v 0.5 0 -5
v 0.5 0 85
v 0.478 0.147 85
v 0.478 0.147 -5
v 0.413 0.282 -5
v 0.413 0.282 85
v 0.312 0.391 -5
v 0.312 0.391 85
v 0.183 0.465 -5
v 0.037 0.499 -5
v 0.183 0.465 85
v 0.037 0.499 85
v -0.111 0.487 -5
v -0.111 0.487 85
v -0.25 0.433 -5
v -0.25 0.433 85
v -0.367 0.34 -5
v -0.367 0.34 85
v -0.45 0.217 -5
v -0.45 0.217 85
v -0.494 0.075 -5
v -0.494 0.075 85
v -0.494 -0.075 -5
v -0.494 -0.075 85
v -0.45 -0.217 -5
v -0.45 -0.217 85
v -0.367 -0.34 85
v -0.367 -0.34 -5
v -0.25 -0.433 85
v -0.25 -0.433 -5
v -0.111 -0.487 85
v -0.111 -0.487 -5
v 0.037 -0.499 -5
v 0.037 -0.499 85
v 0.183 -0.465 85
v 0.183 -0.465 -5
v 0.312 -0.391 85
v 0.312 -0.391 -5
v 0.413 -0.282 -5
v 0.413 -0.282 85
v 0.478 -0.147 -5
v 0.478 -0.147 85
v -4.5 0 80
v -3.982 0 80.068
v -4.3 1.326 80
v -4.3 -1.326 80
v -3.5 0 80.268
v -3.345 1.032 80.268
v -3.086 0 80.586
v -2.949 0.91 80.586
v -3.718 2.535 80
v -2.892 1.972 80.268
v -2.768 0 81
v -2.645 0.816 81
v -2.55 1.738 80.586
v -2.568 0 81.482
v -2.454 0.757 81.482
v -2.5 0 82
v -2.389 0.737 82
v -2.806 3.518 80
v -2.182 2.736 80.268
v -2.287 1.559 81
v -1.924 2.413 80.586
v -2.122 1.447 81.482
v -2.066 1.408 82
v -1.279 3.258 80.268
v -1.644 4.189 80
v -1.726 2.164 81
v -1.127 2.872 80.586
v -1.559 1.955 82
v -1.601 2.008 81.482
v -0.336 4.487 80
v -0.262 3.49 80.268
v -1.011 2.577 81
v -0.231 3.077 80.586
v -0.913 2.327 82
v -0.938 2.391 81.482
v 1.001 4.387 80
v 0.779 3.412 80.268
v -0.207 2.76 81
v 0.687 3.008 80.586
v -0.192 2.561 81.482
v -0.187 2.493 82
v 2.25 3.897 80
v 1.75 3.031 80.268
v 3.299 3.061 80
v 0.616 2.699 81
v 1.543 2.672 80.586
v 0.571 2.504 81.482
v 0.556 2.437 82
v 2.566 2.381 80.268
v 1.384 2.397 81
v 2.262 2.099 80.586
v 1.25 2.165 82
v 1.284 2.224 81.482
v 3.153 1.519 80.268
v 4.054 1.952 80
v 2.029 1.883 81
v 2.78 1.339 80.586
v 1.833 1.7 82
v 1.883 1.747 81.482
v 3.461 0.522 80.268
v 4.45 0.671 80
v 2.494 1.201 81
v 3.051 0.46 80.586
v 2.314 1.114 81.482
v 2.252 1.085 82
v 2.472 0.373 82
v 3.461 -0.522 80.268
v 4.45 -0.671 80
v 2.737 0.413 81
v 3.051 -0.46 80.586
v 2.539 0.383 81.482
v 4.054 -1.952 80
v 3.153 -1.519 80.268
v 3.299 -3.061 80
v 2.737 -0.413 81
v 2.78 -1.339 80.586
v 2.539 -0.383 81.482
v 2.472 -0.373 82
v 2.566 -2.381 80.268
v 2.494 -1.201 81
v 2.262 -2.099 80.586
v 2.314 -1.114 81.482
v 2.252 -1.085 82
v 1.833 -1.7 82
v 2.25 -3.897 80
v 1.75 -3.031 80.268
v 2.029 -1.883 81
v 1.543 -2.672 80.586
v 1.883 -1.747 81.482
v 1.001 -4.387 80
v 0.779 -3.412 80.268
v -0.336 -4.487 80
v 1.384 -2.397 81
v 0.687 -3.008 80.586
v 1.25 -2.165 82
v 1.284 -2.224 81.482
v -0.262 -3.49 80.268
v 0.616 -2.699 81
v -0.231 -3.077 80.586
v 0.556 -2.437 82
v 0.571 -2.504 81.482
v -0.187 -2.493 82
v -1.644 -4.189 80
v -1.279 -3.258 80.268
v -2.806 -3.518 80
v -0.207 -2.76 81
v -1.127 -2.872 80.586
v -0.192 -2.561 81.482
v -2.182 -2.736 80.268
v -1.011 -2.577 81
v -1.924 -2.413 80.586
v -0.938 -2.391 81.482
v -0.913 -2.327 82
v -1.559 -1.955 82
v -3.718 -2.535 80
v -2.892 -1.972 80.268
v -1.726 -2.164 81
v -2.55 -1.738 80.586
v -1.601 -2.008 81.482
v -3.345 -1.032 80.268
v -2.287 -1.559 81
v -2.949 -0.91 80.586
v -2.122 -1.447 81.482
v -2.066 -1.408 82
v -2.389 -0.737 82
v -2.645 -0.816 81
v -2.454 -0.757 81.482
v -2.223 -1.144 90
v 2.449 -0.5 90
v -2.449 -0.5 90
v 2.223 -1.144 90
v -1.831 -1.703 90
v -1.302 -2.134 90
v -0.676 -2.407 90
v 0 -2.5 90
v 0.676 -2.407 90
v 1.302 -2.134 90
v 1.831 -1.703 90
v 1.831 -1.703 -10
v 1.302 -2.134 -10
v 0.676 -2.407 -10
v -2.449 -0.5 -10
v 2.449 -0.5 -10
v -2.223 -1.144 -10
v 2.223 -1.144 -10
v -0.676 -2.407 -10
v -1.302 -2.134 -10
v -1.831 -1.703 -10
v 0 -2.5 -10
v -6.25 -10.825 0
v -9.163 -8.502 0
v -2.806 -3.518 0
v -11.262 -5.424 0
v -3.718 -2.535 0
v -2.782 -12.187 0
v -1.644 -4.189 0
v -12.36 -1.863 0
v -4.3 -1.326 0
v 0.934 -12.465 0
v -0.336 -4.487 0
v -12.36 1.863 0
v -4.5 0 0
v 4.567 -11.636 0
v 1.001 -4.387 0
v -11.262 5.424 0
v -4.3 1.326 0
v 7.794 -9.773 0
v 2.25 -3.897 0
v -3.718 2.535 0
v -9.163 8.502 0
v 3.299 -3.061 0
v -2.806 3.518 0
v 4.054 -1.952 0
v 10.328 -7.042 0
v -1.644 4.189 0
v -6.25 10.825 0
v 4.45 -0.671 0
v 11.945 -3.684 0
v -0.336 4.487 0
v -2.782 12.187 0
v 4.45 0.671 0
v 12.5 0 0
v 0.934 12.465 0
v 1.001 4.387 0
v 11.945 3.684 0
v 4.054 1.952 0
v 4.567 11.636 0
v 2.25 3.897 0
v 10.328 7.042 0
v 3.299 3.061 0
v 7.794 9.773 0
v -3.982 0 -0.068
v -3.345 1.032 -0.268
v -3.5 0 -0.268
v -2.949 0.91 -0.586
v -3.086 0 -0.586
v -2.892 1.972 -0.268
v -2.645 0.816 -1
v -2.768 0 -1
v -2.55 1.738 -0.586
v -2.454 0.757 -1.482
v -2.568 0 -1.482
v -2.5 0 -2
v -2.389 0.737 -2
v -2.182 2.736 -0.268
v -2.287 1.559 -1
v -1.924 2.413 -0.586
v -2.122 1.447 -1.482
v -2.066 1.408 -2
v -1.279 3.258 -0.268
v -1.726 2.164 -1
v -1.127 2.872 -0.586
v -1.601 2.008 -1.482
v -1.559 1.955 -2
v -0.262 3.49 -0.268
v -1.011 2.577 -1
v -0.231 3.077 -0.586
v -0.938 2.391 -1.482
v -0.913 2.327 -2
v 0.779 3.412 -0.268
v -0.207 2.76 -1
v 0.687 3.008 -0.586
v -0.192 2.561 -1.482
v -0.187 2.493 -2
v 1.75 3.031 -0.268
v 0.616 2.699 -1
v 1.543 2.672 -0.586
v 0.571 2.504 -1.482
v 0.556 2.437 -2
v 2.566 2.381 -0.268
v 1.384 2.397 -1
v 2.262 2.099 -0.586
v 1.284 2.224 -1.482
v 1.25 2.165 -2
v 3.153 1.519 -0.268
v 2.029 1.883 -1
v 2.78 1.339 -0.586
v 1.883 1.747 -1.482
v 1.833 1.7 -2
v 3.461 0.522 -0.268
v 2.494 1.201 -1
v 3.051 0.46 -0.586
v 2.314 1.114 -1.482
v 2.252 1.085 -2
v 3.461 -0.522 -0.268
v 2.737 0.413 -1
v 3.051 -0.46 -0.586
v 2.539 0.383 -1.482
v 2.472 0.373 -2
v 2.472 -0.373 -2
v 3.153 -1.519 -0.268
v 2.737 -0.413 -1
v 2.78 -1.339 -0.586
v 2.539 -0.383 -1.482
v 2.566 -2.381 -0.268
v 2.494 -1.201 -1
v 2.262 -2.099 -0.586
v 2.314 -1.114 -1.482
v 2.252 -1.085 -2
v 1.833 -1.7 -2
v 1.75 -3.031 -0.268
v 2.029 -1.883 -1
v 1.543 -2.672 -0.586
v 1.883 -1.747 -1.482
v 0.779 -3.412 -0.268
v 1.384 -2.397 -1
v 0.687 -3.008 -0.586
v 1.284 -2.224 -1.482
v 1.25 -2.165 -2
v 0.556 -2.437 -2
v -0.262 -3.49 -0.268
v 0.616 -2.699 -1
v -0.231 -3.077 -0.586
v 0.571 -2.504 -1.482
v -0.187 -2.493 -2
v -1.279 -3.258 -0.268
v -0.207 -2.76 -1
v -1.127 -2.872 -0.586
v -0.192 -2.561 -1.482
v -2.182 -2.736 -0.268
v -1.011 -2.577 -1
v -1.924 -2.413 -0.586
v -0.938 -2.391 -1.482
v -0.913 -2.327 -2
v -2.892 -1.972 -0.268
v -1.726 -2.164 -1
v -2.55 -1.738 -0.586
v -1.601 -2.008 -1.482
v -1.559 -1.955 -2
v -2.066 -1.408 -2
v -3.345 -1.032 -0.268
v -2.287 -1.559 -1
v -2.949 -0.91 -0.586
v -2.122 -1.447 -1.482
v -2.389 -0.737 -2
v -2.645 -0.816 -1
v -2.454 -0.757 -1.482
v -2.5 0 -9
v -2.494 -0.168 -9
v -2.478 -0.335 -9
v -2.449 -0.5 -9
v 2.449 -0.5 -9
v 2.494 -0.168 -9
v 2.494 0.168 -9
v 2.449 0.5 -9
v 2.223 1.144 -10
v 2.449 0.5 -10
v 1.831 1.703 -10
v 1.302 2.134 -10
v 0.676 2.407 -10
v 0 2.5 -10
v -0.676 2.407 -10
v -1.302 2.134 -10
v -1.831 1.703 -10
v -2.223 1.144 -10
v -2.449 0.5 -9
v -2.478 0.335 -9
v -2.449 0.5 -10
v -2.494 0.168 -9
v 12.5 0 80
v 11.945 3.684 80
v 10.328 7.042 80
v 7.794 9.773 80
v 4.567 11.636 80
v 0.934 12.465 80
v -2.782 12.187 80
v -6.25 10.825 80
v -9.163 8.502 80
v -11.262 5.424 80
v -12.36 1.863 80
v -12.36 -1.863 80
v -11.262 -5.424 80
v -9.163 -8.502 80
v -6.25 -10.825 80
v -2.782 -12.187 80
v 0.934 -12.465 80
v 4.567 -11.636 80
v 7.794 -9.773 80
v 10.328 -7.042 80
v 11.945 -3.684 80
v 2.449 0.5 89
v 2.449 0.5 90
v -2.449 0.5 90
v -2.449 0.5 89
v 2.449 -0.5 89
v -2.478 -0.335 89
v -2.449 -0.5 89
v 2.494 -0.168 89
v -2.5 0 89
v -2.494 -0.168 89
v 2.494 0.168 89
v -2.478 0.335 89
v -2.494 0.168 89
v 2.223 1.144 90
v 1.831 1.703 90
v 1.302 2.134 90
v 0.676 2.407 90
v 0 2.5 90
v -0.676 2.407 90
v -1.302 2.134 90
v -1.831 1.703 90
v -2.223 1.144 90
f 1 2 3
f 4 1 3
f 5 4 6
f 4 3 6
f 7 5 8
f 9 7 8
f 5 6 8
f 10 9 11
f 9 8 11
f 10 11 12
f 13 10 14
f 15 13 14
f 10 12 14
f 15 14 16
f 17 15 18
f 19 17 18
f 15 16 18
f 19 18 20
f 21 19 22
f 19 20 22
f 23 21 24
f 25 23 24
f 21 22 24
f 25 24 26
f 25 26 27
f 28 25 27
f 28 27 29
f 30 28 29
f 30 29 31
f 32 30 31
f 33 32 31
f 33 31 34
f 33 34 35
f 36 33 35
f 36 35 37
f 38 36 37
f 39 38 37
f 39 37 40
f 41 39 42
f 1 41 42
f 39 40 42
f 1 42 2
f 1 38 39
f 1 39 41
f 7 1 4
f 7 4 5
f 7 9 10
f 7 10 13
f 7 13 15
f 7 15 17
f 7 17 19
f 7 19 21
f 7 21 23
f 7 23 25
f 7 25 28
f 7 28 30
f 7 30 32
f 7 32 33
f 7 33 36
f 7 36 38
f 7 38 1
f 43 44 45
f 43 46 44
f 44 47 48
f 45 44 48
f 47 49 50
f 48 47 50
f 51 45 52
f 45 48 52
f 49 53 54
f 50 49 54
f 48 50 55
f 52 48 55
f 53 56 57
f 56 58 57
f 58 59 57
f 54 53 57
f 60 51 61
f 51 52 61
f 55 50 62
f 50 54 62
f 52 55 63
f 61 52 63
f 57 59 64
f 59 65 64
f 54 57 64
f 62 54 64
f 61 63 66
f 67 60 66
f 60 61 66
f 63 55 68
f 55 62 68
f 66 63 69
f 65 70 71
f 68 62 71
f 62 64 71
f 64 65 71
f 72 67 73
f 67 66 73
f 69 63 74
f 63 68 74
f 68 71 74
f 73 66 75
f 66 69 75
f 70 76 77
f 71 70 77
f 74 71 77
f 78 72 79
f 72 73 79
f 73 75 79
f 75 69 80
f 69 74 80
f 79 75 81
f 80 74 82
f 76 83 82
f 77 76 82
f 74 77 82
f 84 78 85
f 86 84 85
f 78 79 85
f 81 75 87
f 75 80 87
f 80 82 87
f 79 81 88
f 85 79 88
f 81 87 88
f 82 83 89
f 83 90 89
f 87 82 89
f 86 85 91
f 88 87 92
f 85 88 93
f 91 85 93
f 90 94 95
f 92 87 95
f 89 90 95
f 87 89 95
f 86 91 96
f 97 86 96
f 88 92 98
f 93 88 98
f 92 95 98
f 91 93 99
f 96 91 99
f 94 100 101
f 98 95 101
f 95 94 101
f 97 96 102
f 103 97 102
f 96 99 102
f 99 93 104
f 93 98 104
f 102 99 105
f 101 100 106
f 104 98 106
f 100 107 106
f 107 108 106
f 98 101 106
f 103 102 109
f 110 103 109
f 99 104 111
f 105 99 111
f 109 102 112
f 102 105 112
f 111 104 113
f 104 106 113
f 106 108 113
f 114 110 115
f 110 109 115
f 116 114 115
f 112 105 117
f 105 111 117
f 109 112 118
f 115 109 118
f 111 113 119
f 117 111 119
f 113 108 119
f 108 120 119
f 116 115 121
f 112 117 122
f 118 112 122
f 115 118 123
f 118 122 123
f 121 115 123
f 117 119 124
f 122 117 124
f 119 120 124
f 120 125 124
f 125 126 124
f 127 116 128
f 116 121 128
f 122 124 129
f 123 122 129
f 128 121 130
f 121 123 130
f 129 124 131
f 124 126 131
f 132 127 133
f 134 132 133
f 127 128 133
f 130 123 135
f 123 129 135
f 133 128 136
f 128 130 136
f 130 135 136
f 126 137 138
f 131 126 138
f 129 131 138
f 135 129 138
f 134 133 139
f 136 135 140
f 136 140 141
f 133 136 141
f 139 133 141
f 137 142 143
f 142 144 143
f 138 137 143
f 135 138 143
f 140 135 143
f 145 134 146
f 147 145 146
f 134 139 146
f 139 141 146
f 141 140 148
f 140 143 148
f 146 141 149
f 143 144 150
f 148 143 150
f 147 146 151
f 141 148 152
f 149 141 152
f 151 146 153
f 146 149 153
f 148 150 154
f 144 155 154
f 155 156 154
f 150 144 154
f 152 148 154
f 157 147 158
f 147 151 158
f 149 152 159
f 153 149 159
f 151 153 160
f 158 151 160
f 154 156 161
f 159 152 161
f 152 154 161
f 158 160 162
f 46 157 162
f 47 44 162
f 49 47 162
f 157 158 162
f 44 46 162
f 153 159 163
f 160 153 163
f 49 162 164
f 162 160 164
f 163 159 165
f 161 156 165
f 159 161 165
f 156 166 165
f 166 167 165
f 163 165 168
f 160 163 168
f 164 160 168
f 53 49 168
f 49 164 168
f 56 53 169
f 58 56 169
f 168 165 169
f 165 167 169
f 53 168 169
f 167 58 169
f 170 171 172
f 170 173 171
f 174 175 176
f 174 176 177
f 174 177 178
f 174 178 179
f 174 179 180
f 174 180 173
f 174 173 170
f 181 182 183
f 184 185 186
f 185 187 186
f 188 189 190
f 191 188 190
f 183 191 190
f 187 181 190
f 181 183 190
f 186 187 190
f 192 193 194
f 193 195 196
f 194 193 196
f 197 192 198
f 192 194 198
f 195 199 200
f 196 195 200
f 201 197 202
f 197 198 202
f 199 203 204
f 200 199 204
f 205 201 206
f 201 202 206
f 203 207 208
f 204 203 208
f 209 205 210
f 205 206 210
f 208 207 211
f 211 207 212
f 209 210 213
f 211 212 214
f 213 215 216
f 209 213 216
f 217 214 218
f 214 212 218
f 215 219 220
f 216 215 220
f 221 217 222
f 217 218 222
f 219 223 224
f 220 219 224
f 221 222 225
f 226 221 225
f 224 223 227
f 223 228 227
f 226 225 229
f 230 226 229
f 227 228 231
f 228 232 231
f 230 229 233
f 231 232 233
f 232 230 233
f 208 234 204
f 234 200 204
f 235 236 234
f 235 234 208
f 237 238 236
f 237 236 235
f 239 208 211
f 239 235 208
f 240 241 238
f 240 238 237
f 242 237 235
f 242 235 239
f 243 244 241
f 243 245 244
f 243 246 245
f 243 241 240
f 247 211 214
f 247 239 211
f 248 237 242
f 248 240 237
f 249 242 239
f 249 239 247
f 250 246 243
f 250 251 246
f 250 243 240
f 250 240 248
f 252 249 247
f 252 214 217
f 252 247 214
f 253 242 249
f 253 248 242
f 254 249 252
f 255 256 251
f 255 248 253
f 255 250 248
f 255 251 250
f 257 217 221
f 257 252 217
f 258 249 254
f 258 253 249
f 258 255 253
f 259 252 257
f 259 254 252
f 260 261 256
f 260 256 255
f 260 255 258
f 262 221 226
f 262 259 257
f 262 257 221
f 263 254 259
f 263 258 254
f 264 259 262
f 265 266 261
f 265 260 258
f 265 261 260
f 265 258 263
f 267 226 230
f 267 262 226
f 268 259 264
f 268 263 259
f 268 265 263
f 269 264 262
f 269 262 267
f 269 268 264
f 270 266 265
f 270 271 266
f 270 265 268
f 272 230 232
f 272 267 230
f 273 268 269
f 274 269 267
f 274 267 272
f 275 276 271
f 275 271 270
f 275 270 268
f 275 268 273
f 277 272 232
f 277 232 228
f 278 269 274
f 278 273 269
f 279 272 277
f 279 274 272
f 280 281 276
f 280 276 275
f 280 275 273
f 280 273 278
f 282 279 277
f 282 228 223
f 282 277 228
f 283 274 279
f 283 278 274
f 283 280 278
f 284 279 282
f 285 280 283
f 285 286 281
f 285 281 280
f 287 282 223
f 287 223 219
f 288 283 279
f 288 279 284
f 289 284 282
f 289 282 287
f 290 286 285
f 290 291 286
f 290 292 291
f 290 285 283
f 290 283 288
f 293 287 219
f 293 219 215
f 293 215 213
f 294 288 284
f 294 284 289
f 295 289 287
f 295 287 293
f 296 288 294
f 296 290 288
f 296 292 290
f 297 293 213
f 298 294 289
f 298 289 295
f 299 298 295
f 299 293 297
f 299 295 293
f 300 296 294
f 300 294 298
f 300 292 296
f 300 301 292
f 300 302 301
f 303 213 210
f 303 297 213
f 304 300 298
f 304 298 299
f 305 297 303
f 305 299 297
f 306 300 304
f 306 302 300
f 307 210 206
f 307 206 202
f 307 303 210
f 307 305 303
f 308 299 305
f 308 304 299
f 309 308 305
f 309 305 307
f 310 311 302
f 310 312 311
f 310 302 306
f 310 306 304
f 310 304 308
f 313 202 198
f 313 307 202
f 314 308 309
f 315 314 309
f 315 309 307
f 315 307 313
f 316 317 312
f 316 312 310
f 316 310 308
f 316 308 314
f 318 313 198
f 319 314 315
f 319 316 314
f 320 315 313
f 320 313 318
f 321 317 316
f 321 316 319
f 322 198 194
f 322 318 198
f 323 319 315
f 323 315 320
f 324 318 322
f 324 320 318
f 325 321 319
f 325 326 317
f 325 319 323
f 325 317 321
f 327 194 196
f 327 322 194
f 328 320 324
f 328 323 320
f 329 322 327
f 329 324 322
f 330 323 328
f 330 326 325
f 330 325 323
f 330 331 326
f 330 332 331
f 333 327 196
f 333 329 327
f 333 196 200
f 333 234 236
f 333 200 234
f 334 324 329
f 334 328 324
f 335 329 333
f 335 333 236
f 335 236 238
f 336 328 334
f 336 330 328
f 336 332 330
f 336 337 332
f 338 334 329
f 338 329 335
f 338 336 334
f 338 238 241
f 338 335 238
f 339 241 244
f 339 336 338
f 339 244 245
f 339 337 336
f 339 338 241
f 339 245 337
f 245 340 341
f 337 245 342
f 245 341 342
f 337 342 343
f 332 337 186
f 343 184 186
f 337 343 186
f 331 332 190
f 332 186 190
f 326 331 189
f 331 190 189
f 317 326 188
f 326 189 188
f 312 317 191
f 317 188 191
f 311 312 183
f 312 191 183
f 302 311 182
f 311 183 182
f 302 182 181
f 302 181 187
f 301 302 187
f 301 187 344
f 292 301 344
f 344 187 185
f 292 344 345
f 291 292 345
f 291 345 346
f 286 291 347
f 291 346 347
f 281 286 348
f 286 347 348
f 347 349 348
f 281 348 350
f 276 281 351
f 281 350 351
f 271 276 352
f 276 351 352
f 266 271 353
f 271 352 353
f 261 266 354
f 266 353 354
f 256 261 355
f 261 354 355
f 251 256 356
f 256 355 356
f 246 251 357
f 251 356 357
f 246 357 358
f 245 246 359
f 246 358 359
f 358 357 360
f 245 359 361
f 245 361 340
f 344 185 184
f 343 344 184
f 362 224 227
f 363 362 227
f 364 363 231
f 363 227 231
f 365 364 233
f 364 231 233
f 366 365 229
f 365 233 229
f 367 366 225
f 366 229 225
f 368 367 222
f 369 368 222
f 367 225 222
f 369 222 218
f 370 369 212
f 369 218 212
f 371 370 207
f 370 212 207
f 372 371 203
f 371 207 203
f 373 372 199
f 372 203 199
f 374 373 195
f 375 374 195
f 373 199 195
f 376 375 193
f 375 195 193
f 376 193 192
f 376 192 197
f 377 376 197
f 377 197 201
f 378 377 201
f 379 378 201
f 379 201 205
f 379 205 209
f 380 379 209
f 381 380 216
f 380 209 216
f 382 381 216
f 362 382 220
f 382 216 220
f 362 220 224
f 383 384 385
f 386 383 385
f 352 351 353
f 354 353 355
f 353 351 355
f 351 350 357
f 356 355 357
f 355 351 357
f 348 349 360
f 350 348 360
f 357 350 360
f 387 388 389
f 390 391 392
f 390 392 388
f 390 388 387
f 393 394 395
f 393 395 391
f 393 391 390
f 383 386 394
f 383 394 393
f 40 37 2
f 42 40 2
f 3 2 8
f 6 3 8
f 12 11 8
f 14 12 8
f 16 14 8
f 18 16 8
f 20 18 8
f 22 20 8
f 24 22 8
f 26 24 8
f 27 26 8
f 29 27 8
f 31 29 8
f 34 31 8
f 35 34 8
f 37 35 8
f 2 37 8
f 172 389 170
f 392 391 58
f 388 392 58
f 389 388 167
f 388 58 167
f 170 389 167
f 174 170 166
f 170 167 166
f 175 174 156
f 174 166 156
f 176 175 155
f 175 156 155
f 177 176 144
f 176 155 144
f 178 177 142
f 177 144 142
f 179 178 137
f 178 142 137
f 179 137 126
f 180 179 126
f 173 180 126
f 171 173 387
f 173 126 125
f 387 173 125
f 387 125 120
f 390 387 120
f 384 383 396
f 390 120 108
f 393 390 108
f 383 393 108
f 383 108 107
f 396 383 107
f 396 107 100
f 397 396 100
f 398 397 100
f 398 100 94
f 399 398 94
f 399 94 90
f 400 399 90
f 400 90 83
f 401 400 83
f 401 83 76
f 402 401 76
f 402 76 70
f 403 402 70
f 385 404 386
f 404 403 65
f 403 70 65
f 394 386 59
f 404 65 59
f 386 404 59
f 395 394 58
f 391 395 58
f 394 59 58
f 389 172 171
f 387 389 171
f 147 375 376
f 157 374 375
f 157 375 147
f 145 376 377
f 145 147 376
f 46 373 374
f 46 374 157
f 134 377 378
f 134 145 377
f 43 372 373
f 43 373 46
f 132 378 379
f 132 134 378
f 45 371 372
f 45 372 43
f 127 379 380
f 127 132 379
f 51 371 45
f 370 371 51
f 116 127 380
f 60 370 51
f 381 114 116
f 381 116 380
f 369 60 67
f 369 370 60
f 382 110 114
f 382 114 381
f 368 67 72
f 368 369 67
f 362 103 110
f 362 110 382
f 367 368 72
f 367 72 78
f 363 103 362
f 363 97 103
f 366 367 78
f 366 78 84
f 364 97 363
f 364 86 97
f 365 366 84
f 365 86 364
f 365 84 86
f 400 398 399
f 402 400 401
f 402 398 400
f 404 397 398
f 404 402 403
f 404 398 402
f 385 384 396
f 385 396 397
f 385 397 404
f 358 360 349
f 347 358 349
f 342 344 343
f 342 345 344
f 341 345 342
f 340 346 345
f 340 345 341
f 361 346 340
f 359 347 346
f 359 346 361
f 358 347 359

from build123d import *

# Parameters (mm, degrees)
ESQUISSE1_R             = 12.5
BOSS_EXTRU_1_DEPTH      = 80
BOSS_EXTRU_2_DEPTH      = 90
BOSS_EXTRU_2_DEPTH_BACK = 10
ESQUISSE2_R             = 2.5
CONG_1_R                = 2
CONG_2_R                = 2
ENL_V_START             = -5
ESQUISSE3_R             = 0.5
ENL_V_MAT_EXTRU_1_DEPTH = 90
ENL_V_MAT_EXTRU_2_DEPTH = 1
ENL_V_MAT_EXTRU_3_DEPTH = 1


with BuildPart() as part:
    # Esquisse1 → Boss.-Extru.1 (new body)
    with BuildSketch(Plane.XY):
        Circle(ESQUISSE1_R)
    extrude(amount=BOSS_EXTRU_1_DEPTH)

    # Esquisse2 → Boss.-Extru.2 (add, two sides: drawn at the far end of the back side and taken through both)
    with BuildSketch(Plane.XY.offset(-BOSS_EXTRU_2_DEPTH_BACK)):
        with Locations(Location((0, 0, 0), (0, 0, 180))):
            Circle(ESQUISSE2_R)
    extrude(amount=BOSS_EXTRU_2_DEPTH + BOSS_EXTRU_2_DEPTH_BACK)

    # Congé1
    cong_1_edges = [part.edges().sort_by_distance(p)[0] for p in [
        (2.5, 0, 80),
    ]]
    fillet(cong_1_edges, radius=CONG_1_R)

    # Congé2
    cong_2_edges = [part.edges().sort_by_distance(p)[0] for p in [
        (2.5, 0, 0),
    ]]
    fillet(cong_2_edges, radius=CONG_2_R)

    # Esquisse3 → Enlèv. mat.-Extru.1 (cut)
    with BuildSketch(Plane.XY.offset(90).offset(ENL_V_START)):
        Circle(ESQUISSE3_R)
    extrude(amount=-ENL_V_MAT_EXTRU_1_DEPTH, mode=Mode.SUBTRACT)

    # Esquisse4 → Enlèv. mat.-Extru.2 (cut)
    with BuildSketch(Plane(origin=(0, 0, -10), x_dir=(-1, 0, 0), z_dir=(0, 0, -1))):
        with BuildLine():
            Line((-2.449489743, -0.5), (2.449489743, -0.5))
            ThreePointArc((2.449489743, -0.5), (2.5, 0), (2.449489743, 0.5))
            Line((2.449489743, 0.5), (-2.449489743, 0.5))
            ThreePointArc((-2.449489743, 0.5), (-2.5, 0), (-2.449489743, -0.5))
        make_face()
    extrude(amount=-ENL_V_MAT_EXTRU_2_DEPTH, mode=Mode.SUBTRACT)

    # Esquisse5 → Enlèv. mat.-Extru.3 (cut)
    with BuildSketch(Plane.XY.offset(90)):
        with BuildLine():
            Line((-2.449489743, -0.5), (2.449489743, -0.5))
            ThreePointArc((2.449489743, -0.5), (2.5, 0), (2.449489743, 0.5))
            Line((2.449489743, 0.5), (-2.449489743, 0.5))
            ThreePointArc((-2.449489743, 0.5), (-2.5, 0), (-2.449489743, -0.5))
        make_face()
    extrude(amount=-ENL_V_MAT_EXTRU_3_DEPTH, mode=Mode.SUBTRACT)


solid = part.part
